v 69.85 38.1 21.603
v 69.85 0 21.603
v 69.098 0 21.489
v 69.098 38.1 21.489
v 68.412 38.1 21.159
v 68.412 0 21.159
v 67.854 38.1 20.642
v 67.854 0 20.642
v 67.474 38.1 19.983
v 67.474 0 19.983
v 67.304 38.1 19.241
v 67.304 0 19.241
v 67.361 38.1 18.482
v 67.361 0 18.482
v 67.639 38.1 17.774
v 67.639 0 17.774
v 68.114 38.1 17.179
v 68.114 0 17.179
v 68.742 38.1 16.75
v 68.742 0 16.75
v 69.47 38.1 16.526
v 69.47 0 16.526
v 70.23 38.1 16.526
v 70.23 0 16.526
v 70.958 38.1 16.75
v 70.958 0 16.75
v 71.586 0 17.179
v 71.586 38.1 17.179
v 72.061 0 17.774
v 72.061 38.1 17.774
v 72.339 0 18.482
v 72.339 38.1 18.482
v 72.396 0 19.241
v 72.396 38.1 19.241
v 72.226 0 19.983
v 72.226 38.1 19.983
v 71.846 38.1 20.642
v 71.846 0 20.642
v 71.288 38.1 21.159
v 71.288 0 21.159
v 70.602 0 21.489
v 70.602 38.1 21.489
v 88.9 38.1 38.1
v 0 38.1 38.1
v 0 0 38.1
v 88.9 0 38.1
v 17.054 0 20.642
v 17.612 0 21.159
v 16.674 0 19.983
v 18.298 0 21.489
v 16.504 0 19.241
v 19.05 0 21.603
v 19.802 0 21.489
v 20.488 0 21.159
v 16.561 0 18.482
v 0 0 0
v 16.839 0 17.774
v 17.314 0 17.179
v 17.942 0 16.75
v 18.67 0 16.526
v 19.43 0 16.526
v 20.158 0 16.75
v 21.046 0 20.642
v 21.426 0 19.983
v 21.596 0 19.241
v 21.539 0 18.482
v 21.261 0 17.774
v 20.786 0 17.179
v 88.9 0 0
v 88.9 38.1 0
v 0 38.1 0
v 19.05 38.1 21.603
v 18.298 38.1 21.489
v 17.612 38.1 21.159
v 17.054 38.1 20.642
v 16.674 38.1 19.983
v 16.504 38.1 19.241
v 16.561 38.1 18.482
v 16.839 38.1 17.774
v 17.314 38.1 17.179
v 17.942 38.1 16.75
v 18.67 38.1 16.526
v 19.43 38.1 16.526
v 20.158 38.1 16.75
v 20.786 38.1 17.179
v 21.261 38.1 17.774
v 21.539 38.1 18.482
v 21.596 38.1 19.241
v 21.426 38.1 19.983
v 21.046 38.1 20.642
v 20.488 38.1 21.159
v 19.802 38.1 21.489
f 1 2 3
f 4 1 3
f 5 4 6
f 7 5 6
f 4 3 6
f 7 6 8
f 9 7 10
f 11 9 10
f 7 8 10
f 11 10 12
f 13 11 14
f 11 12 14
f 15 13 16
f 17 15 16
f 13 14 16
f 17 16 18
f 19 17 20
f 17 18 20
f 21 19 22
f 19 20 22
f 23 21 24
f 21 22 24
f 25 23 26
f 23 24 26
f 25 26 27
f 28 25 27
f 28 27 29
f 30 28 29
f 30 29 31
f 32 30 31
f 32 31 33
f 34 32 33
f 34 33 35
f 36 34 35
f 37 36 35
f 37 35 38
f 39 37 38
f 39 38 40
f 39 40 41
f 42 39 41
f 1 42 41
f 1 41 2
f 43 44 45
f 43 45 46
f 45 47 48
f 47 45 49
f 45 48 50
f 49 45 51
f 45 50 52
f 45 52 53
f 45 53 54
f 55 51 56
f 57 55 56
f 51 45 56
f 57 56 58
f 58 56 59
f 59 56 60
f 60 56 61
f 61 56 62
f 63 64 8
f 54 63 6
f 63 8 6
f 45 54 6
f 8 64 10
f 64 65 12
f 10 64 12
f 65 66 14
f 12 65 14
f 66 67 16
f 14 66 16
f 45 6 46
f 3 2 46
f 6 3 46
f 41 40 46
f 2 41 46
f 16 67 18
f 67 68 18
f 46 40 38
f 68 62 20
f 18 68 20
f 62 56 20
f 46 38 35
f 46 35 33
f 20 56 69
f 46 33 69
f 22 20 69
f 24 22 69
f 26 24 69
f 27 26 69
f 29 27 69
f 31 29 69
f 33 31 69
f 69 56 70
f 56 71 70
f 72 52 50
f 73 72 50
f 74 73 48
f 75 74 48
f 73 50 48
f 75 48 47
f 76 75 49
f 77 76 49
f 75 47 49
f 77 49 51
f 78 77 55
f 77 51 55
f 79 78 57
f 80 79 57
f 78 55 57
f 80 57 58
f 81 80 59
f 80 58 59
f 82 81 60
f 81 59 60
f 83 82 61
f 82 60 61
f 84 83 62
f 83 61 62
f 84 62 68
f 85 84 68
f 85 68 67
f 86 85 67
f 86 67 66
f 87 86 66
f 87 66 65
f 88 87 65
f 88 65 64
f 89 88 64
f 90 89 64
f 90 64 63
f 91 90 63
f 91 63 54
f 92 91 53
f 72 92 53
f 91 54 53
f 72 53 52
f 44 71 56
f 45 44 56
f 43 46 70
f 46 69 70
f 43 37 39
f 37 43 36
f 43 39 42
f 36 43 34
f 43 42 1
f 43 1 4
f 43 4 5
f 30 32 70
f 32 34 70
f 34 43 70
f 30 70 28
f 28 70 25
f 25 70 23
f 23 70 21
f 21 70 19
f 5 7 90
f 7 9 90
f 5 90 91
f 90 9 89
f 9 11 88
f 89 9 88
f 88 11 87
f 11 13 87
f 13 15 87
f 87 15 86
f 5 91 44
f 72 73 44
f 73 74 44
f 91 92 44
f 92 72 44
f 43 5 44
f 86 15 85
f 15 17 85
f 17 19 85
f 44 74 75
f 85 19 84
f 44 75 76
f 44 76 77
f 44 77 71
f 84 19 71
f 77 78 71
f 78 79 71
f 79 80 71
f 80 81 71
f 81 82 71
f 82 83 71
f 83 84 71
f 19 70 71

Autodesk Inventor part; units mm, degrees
ref_plane "YZ Plane" through (0, 0, 0) normal (1, 0, 0) x (0, 1, 0)
ref_plane "XZ Plane" through (0, 0, 0) normal (0, 1, 0) x (-1, 0, 0)
ref_plane "XY Plane" through (0, 0, 0) normal (0, 0, 1) x (1, 0, 0)
sketch "Sketch1" plane through (0, 0, 0) normal (0, 0, 1) x (1, 0, 0)
  line L0 (0, 0) -> (88.9, 0)
  line L1 (88.9, 0) -> (88.9, 38.1)
  line L2 (88.9, 38.1) -> (0, 38.1)
  line L3 (0, 38.1) -> (0, 0)
  dimension "d0" = 88.9
  dimension "d1" = 38.1
extrude "Extrusion1" add sketch "Sketch1" along normal blind 38.1
sketch "Sketch2" plane through (0, 38.1, 0) normal (0, 1, 0) x (1, 0, 0)
  line L0 (88.9, 0) -> (0, 0) projected
  line L1 (0, 0) -> (0, -38.1) projected
  line L2 (88.9, -38.1) -> (0, -38.1) projected
  circle A0 centre (19.05, -19.05) radius 5.8141
  circle A1 centre (69.85, -19.05) radius 5.8141
  dimension "d4" = 19.05
  dimension "d5" = 19.05
  dimension "d8" = 50.8
hole "Hole1" at (19.05, 38.1, 19.05) at (69.85, 38.1, 19.05) direction (0, -1, 0) diameter 5.1054 end through all clearance for "Flat Head Machine Screw (82)" size "#10" standard "Ansi Unified Screw Threads"
equation "\"d18\" = d8"
properties part number "hubjig_spacer" material "Wood (Cherry)"
